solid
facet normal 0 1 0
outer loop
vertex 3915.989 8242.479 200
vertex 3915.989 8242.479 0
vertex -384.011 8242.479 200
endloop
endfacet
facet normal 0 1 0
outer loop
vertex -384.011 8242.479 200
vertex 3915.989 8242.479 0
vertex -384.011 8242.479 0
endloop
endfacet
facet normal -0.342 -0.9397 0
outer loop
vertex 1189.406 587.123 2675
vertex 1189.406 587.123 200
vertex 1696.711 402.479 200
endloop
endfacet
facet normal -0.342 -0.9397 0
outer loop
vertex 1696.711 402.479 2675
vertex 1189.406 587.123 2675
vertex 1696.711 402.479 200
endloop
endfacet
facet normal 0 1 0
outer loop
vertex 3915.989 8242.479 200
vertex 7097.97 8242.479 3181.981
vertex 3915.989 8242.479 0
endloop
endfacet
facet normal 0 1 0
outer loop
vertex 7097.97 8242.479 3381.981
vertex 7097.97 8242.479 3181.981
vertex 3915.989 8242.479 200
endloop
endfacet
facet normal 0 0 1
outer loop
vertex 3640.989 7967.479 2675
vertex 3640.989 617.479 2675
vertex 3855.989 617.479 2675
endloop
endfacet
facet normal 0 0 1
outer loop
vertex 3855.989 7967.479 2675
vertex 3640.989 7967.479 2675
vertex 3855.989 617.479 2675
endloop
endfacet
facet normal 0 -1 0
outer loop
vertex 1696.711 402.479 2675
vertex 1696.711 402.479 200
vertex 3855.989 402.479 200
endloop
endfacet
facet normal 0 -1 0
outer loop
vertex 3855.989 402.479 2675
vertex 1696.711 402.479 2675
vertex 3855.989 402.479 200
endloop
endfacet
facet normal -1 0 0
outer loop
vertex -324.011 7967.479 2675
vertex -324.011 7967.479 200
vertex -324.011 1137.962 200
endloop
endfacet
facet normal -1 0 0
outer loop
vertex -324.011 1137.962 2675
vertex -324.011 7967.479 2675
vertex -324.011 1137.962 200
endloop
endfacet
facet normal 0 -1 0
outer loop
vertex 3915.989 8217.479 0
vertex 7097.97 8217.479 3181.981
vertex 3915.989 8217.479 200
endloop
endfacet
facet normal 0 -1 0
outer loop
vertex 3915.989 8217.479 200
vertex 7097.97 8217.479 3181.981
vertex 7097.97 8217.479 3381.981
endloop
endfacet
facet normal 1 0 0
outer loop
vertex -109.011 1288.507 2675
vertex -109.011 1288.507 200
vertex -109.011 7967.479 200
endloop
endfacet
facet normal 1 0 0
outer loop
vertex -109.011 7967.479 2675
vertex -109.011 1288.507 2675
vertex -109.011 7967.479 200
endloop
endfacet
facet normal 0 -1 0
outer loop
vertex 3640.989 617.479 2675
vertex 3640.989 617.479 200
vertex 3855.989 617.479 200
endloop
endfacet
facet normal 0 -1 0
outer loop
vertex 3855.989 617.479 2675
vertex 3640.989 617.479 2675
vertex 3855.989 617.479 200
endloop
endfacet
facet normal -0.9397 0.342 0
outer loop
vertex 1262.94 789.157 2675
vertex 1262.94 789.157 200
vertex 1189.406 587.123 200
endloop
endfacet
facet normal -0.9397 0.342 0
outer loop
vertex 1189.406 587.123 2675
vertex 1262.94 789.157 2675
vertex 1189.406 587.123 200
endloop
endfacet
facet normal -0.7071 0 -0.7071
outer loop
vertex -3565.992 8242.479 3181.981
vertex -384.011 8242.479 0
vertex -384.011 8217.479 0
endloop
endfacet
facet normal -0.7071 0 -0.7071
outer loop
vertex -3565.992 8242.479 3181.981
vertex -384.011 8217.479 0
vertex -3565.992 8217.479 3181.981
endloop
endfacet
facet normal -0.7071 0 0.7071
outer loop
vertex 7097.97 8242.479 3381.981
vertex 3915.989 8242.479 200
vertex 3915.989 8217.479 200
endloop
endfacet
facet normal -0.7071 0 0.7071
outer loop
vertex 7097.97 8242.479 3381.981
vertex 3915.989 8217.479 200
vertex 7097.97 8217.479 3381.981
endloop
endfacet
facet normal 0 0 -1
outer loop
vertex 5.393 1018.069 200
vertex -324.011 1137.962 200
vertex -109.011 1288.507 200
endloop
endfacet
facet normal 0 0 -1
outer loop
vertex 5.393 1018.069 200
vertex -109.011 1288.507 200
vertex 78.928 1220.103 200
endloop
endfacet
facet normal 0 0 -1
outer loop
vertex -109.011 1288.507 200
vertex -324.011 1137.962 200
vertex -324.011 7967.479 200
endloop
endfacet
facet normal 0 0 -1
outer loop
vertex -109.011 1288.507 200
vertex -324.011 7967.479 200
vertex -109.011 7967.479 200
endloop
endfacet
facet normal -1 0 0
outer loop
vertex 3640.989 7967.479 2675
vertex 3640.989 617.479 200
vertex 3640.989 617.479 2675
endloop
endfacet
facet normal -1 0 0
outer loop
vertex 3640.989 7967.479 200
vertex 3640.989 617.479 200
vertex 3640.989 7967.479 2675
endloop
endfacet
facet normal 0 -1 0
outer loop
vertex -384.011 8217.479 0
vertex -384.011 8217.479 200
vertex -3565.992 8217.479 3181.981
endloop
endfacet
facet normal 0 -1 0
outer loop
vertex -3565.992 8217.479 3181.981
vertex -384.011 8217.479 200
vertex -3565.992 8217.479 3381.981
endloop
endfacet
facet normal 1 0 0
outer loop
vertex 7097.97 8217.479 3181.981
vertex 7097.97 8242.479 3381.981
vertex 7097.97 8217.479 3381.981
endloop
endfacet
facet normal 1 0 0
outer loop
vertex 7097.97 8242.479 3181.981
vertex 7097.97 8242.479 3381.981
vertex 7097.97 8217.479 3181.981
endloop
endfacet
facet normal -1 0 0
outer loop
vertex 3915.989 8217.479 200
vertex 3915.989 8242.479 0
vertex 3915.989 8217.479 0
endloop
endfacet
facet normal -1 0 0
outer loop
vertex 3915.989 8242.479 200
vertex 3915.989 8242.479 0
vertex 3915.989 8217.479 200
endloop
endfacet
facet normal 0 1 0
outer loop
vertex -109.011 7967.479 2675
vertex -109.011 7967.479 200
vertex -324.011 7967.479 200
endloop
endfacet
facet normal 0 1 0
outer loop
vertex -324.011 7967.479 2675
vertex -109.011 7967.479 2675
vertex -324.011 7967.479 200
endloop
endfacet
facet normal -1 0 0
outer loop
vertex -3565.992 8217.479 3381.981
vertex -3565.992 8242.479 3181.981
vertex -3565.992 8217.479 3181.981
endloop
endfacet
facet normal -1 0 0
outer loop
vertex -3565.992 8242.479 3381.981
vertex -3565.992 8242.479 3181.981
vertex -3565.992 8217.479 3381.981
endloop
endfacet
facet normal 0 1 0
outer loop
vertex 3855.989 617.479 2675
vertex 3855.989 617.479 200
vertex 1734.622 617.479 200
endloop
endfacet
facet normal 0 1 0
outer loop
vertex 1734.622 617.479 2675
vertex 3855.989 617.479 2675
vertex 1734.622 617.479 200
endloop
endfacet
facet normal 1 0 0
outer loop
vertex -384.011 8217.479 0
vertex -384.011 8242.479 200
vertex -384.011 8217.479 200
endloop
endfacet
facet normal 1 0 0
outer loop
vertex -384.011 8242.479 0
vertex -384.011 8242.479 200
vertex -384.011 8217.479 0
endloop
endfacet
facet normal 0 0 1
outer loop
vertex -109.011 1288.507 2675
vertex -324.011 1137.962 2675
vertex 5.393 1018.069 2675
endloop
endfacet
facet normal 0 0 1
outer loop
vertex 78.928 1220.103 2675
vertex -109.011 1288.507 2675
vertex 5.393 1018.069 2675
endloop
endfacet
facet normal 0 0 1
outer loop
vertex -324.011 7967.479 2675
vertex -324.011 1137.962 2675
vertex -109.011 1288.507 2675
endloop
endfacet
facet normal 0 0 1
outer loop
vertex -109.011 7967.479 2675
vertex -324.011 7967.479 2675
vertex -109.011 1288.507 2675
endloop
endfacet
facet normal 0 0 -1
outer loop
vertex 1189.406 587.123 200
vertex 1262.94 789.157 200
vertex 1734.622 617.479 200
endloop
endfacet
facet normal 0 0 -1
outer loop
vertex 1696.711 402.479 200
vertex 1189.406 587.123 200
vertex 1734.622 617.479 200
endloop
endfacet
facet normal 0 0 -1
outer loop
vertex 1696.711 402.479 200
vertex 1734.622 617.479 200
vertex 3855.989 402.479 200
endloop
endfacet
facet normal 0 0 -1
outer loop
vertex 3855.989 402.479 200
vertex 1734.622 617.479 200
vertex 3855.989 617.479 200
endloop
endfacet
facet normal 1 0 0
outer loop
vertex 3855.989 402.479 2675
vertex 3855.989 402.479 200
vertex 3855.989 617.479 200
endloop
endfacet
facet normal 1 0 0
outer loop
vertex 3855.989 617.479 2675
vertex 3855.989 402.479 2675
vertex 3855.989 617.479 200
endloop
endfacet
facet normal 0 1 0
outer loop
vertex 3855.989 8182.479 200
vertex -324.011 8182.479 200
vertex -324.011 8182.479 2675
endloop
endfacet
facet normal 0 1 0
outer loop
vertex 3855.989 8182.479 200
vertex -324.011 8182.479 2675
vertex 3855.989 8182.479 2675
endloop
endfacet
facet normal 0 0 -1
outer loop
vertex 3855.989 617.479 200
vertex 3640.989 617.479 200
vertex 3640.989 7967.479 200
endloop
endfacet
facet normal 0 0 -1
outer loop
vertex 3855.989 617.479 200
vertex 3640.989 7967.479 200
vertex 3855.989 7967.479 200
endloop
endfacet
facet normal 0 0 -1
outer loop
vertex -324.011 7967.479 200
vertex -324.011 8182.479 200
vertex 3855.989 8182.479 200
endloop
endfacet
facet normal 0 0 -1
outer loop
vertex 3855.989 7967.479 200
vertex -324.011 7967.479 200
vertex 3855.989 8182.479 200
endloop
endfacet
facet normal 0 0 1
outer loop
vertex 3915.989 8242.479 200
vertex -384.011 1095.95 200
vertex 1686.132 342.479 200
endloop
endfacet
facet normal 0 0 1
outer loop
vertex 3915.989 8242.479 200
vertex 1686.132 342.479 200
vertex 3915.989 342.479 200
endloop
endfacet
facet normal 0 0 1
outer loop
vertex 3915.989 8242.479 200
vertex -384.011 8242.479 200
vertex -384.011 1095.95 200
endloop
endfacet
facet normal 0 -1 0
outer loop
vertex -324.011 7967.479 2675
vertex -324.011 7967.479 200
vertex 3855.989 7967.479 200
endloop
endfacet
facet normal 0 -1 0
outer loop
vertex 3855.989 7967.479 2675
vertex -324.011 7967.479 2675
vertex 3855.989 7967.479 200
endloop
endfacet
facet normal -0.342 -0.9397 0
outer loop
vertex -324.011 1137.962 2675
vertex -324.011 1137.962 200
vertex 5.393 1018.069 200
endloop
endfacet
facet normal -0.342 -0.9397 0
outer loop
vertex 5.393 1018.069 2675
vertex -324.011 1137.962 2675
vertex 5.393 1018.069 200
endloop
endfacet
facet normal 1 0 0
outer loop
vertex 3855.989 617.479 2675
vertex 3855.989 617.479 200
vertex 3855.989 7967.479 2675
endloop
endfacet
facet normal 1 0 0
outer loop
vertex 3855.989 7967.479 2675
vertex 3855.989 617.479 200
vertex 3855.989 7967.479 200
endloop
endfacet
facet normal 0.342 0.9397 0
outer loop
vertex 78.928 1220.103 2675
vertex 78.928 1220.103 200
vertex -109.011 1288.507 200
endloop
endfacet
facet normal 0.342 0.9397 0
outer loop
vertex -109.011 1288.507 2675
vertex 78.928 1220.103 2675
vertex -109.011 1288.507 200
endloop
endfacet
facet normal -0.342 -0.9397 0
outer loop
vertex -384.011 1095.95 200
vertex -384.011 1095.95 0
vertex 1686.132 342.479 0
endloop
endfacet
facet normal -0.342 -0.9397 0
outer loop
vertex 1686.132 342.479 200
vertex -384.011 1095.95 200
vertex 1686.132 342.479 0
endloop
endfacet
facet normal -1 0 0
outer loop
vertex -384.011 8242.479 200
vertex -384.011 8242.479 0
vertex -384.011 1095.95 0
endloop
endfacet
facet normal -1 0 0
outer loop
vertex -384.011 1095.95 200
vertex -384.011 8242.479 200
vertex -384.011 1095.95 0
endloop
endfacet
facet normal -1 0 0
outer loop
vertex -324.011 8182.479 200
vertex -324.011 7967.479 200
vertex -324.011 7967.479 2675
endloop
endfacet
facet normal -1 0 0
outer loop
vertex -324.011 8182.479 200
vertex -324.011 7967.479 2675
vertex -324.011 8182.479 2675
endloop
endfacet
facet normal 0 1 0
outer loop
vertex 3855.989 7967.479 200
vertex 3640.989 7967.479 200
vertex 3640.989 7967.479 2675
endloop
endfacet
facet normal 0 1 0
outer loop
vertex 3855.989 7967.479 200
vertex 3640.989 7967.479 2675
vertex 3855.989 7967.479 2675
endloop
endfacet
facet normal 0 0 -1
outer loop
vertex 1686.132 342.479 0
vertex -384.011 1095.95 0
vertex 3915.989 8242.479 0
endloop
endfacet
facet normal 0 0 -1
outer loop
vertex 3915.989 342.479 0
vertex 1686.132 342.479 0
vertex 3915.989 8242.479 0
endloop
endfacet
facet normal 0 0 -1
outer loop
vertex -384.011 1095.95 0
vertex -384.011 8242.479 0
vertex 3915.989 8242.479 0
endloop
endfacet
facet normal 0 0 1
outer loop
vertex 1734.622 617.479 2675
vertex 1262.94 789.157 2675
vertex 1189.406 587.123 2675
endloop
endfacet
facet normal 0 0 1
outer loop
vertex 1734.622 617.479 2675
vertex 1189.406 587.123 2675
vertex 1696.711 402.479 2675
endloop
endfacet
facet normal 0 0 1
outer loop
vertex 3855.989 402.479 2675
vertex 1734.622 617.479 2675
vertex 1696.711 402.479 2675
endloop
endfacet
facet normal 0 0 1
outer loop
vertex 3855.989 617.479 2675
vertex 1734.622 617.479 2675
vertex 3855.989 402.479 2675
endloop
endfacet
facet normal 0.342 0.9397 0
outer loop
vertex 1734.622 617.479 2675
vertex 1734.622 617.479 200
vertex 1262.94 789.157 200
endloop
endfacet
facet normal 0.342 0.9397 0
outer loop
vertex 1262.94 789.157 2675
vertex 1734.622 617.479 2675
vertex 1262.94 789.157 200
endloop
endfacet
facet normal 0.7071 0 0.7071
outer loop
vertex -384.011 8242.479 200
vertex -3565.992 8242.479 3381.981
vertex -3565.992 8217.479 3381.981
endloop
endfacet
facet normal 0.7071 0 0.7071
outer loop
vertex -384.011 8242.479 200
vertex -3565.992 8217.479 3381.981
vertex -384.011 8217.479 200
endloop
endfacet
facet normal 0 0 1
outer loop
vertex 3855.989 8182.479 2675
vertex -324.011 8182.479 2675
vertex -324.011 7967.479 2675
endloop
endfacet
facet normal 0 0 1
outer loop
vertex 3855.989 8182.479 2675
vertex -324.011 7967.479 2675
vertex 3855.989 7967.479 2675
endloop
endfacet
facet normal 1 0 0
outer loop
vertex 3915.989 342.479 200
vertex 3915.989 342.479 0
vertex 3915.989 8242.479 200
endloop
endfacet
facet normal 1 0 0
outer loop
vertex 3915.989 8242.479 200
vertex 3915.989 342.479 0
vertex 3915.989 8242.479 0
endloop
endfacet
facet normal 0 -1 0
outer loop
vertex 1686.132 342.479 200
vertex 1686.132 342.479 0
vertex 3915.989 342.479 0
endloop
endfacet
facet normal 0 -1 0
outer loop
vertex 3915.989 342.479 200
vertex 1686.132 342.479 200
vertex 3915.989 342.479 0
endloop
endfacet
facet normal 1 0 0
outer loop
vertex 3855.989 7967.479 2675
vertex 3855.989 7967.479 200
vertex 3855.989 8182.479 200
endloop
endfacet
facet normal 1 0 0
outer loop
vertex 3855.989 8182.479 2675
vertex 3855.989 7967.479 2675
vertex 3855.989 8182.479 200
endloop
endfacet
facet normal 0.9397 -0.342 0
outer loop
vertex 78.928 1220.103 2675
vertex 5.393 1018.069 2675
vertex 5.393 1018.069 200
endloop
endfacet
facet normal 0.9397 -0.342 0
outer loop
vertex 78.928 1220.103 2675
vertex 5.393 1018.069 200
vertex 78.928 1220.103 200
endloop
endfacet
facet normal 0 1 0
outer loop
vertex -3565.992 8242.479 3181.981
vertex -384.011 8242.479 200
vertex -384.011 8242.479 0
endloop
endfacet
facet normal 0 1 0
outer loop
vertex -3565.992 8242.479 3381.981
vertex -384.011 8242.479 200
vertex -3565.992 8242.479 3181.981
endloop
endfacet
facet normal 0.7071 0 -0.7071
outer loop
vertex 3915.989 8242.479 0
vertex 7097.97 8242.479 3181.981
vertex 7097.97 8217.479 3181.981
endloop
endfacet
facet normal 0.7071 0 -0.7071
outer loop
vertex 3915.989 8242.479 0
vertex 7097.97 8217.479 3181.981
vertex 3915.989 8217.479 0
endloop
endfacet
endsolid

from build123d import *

# Parameters (mm, degrees)
F1_DEPTH  = 200
F2_W      = 215
F2_H      = 7350
F3_DEPTH  = 2475
F5_DEPTH  = 2475
F6_W      = 4180
F6_H      = 215
F7_DEPTH  = 2475
F9_DEPTH  = 25
F10_DEPTH = 25
F12_DEPTH = 2475


with BuildPart() as f1:
    # F0 (on Top) → F1 (new body)
    with BuildSketch(Plane.XY):
        Polygon((-384.0109936075, 1095.9495513227), (1686.1318499839, 342.4791755763), (3915.9890063925, 342.4791755763), (3915.9890063925, 8242.4791755763), (-384.0109936075, 8242.4791755763), align=None)
    extrude(amount=F1_DEPTH)


with BuildPart() as f3:
    # F2 (on face) → F3 (new body)
    with BuildSketch(Plane.XY.offset(200)):
        with Locations((3748.4890063925, 4292.4791755763)):
            Rectangle(F2_W, F2_H)
    extrude(amount=F3_DEPTH)


with BuildPart() as f5:
    # F4 (on face) → F5 (new body)
    with BuildSketch(Plane.XY.offset(200)):
        Polygon((-109.0109936075, 7967.4791755763), (-324.0109936075, 7967.4791755763), (-324.0109936075, 1137.9620036153), (5.3931997347, 1018.0686821963), (78.9275305497, 1220.1025956653), (-109.0109936075, 1288.5066243304), align=None)
    extrude(amount=F5_DEPTH)


with BuildPart() as f7:
    # F6 (on face) → F7 (new body)
    with BuildSketch(Plane.XY.offset(200)):
        with Locations((1765.9890063925, 8074.9791755763)):
            Rectangle(F6_W, F6_H)
    extrude(amount=F7_DEPTH)


with BuildPart() as f9:
    # F8 (on face) → F9 (new body)
    with BuildSketch(Plane(origin=(0, 8242.4791755763, 0), x_dir=(-1, 0, 0), z_dir=(0, 1, 0))):
        Polygon((-7097.969521732, 3181.9805153395), (-3915.9890063925, 0), (-3915.9890063925, 200), (-7097.969521732, 3381.9805153395), align=None)
    extrude(amount=-F9_DEPTH)


with BuildPart() as f10:
    # F8 (on face) → F10 (new body)
    with BuildSketch(Plane(origin=(0, 8242.4791755763, 0), x_dir=(-1, 0, 0), z_dir=(0, 1, 0))):
        Polygon((384.0109936075, 200), (384.0109936075, 0), (3565.991508947, 3181.9805153395), (3565.991508947, 3381.9805153395), align=None)
    extrude(amount=-F10_DEPTH)


with BuildPart() as f12:
    # F11 (on face) → F12 (new body)
    with BuildSketch(Plane.XY.offset(200)):
        Polygon((3855.9890063925, 402.4791755763), (3855.9890063925, 617.4791755763), (1734.6217696787, 617.4791755763), (1262.9402327399, 789.1572150749), (1189.4059019249, 587.123301606), (1696.7114688264, 402.4791755763), align=None)
    extrude(amount=F12_DEPTH)


solid = Compound([f1.part, f3.part, f5.part, f7.part, f9.part, f10.part, f12.part])
